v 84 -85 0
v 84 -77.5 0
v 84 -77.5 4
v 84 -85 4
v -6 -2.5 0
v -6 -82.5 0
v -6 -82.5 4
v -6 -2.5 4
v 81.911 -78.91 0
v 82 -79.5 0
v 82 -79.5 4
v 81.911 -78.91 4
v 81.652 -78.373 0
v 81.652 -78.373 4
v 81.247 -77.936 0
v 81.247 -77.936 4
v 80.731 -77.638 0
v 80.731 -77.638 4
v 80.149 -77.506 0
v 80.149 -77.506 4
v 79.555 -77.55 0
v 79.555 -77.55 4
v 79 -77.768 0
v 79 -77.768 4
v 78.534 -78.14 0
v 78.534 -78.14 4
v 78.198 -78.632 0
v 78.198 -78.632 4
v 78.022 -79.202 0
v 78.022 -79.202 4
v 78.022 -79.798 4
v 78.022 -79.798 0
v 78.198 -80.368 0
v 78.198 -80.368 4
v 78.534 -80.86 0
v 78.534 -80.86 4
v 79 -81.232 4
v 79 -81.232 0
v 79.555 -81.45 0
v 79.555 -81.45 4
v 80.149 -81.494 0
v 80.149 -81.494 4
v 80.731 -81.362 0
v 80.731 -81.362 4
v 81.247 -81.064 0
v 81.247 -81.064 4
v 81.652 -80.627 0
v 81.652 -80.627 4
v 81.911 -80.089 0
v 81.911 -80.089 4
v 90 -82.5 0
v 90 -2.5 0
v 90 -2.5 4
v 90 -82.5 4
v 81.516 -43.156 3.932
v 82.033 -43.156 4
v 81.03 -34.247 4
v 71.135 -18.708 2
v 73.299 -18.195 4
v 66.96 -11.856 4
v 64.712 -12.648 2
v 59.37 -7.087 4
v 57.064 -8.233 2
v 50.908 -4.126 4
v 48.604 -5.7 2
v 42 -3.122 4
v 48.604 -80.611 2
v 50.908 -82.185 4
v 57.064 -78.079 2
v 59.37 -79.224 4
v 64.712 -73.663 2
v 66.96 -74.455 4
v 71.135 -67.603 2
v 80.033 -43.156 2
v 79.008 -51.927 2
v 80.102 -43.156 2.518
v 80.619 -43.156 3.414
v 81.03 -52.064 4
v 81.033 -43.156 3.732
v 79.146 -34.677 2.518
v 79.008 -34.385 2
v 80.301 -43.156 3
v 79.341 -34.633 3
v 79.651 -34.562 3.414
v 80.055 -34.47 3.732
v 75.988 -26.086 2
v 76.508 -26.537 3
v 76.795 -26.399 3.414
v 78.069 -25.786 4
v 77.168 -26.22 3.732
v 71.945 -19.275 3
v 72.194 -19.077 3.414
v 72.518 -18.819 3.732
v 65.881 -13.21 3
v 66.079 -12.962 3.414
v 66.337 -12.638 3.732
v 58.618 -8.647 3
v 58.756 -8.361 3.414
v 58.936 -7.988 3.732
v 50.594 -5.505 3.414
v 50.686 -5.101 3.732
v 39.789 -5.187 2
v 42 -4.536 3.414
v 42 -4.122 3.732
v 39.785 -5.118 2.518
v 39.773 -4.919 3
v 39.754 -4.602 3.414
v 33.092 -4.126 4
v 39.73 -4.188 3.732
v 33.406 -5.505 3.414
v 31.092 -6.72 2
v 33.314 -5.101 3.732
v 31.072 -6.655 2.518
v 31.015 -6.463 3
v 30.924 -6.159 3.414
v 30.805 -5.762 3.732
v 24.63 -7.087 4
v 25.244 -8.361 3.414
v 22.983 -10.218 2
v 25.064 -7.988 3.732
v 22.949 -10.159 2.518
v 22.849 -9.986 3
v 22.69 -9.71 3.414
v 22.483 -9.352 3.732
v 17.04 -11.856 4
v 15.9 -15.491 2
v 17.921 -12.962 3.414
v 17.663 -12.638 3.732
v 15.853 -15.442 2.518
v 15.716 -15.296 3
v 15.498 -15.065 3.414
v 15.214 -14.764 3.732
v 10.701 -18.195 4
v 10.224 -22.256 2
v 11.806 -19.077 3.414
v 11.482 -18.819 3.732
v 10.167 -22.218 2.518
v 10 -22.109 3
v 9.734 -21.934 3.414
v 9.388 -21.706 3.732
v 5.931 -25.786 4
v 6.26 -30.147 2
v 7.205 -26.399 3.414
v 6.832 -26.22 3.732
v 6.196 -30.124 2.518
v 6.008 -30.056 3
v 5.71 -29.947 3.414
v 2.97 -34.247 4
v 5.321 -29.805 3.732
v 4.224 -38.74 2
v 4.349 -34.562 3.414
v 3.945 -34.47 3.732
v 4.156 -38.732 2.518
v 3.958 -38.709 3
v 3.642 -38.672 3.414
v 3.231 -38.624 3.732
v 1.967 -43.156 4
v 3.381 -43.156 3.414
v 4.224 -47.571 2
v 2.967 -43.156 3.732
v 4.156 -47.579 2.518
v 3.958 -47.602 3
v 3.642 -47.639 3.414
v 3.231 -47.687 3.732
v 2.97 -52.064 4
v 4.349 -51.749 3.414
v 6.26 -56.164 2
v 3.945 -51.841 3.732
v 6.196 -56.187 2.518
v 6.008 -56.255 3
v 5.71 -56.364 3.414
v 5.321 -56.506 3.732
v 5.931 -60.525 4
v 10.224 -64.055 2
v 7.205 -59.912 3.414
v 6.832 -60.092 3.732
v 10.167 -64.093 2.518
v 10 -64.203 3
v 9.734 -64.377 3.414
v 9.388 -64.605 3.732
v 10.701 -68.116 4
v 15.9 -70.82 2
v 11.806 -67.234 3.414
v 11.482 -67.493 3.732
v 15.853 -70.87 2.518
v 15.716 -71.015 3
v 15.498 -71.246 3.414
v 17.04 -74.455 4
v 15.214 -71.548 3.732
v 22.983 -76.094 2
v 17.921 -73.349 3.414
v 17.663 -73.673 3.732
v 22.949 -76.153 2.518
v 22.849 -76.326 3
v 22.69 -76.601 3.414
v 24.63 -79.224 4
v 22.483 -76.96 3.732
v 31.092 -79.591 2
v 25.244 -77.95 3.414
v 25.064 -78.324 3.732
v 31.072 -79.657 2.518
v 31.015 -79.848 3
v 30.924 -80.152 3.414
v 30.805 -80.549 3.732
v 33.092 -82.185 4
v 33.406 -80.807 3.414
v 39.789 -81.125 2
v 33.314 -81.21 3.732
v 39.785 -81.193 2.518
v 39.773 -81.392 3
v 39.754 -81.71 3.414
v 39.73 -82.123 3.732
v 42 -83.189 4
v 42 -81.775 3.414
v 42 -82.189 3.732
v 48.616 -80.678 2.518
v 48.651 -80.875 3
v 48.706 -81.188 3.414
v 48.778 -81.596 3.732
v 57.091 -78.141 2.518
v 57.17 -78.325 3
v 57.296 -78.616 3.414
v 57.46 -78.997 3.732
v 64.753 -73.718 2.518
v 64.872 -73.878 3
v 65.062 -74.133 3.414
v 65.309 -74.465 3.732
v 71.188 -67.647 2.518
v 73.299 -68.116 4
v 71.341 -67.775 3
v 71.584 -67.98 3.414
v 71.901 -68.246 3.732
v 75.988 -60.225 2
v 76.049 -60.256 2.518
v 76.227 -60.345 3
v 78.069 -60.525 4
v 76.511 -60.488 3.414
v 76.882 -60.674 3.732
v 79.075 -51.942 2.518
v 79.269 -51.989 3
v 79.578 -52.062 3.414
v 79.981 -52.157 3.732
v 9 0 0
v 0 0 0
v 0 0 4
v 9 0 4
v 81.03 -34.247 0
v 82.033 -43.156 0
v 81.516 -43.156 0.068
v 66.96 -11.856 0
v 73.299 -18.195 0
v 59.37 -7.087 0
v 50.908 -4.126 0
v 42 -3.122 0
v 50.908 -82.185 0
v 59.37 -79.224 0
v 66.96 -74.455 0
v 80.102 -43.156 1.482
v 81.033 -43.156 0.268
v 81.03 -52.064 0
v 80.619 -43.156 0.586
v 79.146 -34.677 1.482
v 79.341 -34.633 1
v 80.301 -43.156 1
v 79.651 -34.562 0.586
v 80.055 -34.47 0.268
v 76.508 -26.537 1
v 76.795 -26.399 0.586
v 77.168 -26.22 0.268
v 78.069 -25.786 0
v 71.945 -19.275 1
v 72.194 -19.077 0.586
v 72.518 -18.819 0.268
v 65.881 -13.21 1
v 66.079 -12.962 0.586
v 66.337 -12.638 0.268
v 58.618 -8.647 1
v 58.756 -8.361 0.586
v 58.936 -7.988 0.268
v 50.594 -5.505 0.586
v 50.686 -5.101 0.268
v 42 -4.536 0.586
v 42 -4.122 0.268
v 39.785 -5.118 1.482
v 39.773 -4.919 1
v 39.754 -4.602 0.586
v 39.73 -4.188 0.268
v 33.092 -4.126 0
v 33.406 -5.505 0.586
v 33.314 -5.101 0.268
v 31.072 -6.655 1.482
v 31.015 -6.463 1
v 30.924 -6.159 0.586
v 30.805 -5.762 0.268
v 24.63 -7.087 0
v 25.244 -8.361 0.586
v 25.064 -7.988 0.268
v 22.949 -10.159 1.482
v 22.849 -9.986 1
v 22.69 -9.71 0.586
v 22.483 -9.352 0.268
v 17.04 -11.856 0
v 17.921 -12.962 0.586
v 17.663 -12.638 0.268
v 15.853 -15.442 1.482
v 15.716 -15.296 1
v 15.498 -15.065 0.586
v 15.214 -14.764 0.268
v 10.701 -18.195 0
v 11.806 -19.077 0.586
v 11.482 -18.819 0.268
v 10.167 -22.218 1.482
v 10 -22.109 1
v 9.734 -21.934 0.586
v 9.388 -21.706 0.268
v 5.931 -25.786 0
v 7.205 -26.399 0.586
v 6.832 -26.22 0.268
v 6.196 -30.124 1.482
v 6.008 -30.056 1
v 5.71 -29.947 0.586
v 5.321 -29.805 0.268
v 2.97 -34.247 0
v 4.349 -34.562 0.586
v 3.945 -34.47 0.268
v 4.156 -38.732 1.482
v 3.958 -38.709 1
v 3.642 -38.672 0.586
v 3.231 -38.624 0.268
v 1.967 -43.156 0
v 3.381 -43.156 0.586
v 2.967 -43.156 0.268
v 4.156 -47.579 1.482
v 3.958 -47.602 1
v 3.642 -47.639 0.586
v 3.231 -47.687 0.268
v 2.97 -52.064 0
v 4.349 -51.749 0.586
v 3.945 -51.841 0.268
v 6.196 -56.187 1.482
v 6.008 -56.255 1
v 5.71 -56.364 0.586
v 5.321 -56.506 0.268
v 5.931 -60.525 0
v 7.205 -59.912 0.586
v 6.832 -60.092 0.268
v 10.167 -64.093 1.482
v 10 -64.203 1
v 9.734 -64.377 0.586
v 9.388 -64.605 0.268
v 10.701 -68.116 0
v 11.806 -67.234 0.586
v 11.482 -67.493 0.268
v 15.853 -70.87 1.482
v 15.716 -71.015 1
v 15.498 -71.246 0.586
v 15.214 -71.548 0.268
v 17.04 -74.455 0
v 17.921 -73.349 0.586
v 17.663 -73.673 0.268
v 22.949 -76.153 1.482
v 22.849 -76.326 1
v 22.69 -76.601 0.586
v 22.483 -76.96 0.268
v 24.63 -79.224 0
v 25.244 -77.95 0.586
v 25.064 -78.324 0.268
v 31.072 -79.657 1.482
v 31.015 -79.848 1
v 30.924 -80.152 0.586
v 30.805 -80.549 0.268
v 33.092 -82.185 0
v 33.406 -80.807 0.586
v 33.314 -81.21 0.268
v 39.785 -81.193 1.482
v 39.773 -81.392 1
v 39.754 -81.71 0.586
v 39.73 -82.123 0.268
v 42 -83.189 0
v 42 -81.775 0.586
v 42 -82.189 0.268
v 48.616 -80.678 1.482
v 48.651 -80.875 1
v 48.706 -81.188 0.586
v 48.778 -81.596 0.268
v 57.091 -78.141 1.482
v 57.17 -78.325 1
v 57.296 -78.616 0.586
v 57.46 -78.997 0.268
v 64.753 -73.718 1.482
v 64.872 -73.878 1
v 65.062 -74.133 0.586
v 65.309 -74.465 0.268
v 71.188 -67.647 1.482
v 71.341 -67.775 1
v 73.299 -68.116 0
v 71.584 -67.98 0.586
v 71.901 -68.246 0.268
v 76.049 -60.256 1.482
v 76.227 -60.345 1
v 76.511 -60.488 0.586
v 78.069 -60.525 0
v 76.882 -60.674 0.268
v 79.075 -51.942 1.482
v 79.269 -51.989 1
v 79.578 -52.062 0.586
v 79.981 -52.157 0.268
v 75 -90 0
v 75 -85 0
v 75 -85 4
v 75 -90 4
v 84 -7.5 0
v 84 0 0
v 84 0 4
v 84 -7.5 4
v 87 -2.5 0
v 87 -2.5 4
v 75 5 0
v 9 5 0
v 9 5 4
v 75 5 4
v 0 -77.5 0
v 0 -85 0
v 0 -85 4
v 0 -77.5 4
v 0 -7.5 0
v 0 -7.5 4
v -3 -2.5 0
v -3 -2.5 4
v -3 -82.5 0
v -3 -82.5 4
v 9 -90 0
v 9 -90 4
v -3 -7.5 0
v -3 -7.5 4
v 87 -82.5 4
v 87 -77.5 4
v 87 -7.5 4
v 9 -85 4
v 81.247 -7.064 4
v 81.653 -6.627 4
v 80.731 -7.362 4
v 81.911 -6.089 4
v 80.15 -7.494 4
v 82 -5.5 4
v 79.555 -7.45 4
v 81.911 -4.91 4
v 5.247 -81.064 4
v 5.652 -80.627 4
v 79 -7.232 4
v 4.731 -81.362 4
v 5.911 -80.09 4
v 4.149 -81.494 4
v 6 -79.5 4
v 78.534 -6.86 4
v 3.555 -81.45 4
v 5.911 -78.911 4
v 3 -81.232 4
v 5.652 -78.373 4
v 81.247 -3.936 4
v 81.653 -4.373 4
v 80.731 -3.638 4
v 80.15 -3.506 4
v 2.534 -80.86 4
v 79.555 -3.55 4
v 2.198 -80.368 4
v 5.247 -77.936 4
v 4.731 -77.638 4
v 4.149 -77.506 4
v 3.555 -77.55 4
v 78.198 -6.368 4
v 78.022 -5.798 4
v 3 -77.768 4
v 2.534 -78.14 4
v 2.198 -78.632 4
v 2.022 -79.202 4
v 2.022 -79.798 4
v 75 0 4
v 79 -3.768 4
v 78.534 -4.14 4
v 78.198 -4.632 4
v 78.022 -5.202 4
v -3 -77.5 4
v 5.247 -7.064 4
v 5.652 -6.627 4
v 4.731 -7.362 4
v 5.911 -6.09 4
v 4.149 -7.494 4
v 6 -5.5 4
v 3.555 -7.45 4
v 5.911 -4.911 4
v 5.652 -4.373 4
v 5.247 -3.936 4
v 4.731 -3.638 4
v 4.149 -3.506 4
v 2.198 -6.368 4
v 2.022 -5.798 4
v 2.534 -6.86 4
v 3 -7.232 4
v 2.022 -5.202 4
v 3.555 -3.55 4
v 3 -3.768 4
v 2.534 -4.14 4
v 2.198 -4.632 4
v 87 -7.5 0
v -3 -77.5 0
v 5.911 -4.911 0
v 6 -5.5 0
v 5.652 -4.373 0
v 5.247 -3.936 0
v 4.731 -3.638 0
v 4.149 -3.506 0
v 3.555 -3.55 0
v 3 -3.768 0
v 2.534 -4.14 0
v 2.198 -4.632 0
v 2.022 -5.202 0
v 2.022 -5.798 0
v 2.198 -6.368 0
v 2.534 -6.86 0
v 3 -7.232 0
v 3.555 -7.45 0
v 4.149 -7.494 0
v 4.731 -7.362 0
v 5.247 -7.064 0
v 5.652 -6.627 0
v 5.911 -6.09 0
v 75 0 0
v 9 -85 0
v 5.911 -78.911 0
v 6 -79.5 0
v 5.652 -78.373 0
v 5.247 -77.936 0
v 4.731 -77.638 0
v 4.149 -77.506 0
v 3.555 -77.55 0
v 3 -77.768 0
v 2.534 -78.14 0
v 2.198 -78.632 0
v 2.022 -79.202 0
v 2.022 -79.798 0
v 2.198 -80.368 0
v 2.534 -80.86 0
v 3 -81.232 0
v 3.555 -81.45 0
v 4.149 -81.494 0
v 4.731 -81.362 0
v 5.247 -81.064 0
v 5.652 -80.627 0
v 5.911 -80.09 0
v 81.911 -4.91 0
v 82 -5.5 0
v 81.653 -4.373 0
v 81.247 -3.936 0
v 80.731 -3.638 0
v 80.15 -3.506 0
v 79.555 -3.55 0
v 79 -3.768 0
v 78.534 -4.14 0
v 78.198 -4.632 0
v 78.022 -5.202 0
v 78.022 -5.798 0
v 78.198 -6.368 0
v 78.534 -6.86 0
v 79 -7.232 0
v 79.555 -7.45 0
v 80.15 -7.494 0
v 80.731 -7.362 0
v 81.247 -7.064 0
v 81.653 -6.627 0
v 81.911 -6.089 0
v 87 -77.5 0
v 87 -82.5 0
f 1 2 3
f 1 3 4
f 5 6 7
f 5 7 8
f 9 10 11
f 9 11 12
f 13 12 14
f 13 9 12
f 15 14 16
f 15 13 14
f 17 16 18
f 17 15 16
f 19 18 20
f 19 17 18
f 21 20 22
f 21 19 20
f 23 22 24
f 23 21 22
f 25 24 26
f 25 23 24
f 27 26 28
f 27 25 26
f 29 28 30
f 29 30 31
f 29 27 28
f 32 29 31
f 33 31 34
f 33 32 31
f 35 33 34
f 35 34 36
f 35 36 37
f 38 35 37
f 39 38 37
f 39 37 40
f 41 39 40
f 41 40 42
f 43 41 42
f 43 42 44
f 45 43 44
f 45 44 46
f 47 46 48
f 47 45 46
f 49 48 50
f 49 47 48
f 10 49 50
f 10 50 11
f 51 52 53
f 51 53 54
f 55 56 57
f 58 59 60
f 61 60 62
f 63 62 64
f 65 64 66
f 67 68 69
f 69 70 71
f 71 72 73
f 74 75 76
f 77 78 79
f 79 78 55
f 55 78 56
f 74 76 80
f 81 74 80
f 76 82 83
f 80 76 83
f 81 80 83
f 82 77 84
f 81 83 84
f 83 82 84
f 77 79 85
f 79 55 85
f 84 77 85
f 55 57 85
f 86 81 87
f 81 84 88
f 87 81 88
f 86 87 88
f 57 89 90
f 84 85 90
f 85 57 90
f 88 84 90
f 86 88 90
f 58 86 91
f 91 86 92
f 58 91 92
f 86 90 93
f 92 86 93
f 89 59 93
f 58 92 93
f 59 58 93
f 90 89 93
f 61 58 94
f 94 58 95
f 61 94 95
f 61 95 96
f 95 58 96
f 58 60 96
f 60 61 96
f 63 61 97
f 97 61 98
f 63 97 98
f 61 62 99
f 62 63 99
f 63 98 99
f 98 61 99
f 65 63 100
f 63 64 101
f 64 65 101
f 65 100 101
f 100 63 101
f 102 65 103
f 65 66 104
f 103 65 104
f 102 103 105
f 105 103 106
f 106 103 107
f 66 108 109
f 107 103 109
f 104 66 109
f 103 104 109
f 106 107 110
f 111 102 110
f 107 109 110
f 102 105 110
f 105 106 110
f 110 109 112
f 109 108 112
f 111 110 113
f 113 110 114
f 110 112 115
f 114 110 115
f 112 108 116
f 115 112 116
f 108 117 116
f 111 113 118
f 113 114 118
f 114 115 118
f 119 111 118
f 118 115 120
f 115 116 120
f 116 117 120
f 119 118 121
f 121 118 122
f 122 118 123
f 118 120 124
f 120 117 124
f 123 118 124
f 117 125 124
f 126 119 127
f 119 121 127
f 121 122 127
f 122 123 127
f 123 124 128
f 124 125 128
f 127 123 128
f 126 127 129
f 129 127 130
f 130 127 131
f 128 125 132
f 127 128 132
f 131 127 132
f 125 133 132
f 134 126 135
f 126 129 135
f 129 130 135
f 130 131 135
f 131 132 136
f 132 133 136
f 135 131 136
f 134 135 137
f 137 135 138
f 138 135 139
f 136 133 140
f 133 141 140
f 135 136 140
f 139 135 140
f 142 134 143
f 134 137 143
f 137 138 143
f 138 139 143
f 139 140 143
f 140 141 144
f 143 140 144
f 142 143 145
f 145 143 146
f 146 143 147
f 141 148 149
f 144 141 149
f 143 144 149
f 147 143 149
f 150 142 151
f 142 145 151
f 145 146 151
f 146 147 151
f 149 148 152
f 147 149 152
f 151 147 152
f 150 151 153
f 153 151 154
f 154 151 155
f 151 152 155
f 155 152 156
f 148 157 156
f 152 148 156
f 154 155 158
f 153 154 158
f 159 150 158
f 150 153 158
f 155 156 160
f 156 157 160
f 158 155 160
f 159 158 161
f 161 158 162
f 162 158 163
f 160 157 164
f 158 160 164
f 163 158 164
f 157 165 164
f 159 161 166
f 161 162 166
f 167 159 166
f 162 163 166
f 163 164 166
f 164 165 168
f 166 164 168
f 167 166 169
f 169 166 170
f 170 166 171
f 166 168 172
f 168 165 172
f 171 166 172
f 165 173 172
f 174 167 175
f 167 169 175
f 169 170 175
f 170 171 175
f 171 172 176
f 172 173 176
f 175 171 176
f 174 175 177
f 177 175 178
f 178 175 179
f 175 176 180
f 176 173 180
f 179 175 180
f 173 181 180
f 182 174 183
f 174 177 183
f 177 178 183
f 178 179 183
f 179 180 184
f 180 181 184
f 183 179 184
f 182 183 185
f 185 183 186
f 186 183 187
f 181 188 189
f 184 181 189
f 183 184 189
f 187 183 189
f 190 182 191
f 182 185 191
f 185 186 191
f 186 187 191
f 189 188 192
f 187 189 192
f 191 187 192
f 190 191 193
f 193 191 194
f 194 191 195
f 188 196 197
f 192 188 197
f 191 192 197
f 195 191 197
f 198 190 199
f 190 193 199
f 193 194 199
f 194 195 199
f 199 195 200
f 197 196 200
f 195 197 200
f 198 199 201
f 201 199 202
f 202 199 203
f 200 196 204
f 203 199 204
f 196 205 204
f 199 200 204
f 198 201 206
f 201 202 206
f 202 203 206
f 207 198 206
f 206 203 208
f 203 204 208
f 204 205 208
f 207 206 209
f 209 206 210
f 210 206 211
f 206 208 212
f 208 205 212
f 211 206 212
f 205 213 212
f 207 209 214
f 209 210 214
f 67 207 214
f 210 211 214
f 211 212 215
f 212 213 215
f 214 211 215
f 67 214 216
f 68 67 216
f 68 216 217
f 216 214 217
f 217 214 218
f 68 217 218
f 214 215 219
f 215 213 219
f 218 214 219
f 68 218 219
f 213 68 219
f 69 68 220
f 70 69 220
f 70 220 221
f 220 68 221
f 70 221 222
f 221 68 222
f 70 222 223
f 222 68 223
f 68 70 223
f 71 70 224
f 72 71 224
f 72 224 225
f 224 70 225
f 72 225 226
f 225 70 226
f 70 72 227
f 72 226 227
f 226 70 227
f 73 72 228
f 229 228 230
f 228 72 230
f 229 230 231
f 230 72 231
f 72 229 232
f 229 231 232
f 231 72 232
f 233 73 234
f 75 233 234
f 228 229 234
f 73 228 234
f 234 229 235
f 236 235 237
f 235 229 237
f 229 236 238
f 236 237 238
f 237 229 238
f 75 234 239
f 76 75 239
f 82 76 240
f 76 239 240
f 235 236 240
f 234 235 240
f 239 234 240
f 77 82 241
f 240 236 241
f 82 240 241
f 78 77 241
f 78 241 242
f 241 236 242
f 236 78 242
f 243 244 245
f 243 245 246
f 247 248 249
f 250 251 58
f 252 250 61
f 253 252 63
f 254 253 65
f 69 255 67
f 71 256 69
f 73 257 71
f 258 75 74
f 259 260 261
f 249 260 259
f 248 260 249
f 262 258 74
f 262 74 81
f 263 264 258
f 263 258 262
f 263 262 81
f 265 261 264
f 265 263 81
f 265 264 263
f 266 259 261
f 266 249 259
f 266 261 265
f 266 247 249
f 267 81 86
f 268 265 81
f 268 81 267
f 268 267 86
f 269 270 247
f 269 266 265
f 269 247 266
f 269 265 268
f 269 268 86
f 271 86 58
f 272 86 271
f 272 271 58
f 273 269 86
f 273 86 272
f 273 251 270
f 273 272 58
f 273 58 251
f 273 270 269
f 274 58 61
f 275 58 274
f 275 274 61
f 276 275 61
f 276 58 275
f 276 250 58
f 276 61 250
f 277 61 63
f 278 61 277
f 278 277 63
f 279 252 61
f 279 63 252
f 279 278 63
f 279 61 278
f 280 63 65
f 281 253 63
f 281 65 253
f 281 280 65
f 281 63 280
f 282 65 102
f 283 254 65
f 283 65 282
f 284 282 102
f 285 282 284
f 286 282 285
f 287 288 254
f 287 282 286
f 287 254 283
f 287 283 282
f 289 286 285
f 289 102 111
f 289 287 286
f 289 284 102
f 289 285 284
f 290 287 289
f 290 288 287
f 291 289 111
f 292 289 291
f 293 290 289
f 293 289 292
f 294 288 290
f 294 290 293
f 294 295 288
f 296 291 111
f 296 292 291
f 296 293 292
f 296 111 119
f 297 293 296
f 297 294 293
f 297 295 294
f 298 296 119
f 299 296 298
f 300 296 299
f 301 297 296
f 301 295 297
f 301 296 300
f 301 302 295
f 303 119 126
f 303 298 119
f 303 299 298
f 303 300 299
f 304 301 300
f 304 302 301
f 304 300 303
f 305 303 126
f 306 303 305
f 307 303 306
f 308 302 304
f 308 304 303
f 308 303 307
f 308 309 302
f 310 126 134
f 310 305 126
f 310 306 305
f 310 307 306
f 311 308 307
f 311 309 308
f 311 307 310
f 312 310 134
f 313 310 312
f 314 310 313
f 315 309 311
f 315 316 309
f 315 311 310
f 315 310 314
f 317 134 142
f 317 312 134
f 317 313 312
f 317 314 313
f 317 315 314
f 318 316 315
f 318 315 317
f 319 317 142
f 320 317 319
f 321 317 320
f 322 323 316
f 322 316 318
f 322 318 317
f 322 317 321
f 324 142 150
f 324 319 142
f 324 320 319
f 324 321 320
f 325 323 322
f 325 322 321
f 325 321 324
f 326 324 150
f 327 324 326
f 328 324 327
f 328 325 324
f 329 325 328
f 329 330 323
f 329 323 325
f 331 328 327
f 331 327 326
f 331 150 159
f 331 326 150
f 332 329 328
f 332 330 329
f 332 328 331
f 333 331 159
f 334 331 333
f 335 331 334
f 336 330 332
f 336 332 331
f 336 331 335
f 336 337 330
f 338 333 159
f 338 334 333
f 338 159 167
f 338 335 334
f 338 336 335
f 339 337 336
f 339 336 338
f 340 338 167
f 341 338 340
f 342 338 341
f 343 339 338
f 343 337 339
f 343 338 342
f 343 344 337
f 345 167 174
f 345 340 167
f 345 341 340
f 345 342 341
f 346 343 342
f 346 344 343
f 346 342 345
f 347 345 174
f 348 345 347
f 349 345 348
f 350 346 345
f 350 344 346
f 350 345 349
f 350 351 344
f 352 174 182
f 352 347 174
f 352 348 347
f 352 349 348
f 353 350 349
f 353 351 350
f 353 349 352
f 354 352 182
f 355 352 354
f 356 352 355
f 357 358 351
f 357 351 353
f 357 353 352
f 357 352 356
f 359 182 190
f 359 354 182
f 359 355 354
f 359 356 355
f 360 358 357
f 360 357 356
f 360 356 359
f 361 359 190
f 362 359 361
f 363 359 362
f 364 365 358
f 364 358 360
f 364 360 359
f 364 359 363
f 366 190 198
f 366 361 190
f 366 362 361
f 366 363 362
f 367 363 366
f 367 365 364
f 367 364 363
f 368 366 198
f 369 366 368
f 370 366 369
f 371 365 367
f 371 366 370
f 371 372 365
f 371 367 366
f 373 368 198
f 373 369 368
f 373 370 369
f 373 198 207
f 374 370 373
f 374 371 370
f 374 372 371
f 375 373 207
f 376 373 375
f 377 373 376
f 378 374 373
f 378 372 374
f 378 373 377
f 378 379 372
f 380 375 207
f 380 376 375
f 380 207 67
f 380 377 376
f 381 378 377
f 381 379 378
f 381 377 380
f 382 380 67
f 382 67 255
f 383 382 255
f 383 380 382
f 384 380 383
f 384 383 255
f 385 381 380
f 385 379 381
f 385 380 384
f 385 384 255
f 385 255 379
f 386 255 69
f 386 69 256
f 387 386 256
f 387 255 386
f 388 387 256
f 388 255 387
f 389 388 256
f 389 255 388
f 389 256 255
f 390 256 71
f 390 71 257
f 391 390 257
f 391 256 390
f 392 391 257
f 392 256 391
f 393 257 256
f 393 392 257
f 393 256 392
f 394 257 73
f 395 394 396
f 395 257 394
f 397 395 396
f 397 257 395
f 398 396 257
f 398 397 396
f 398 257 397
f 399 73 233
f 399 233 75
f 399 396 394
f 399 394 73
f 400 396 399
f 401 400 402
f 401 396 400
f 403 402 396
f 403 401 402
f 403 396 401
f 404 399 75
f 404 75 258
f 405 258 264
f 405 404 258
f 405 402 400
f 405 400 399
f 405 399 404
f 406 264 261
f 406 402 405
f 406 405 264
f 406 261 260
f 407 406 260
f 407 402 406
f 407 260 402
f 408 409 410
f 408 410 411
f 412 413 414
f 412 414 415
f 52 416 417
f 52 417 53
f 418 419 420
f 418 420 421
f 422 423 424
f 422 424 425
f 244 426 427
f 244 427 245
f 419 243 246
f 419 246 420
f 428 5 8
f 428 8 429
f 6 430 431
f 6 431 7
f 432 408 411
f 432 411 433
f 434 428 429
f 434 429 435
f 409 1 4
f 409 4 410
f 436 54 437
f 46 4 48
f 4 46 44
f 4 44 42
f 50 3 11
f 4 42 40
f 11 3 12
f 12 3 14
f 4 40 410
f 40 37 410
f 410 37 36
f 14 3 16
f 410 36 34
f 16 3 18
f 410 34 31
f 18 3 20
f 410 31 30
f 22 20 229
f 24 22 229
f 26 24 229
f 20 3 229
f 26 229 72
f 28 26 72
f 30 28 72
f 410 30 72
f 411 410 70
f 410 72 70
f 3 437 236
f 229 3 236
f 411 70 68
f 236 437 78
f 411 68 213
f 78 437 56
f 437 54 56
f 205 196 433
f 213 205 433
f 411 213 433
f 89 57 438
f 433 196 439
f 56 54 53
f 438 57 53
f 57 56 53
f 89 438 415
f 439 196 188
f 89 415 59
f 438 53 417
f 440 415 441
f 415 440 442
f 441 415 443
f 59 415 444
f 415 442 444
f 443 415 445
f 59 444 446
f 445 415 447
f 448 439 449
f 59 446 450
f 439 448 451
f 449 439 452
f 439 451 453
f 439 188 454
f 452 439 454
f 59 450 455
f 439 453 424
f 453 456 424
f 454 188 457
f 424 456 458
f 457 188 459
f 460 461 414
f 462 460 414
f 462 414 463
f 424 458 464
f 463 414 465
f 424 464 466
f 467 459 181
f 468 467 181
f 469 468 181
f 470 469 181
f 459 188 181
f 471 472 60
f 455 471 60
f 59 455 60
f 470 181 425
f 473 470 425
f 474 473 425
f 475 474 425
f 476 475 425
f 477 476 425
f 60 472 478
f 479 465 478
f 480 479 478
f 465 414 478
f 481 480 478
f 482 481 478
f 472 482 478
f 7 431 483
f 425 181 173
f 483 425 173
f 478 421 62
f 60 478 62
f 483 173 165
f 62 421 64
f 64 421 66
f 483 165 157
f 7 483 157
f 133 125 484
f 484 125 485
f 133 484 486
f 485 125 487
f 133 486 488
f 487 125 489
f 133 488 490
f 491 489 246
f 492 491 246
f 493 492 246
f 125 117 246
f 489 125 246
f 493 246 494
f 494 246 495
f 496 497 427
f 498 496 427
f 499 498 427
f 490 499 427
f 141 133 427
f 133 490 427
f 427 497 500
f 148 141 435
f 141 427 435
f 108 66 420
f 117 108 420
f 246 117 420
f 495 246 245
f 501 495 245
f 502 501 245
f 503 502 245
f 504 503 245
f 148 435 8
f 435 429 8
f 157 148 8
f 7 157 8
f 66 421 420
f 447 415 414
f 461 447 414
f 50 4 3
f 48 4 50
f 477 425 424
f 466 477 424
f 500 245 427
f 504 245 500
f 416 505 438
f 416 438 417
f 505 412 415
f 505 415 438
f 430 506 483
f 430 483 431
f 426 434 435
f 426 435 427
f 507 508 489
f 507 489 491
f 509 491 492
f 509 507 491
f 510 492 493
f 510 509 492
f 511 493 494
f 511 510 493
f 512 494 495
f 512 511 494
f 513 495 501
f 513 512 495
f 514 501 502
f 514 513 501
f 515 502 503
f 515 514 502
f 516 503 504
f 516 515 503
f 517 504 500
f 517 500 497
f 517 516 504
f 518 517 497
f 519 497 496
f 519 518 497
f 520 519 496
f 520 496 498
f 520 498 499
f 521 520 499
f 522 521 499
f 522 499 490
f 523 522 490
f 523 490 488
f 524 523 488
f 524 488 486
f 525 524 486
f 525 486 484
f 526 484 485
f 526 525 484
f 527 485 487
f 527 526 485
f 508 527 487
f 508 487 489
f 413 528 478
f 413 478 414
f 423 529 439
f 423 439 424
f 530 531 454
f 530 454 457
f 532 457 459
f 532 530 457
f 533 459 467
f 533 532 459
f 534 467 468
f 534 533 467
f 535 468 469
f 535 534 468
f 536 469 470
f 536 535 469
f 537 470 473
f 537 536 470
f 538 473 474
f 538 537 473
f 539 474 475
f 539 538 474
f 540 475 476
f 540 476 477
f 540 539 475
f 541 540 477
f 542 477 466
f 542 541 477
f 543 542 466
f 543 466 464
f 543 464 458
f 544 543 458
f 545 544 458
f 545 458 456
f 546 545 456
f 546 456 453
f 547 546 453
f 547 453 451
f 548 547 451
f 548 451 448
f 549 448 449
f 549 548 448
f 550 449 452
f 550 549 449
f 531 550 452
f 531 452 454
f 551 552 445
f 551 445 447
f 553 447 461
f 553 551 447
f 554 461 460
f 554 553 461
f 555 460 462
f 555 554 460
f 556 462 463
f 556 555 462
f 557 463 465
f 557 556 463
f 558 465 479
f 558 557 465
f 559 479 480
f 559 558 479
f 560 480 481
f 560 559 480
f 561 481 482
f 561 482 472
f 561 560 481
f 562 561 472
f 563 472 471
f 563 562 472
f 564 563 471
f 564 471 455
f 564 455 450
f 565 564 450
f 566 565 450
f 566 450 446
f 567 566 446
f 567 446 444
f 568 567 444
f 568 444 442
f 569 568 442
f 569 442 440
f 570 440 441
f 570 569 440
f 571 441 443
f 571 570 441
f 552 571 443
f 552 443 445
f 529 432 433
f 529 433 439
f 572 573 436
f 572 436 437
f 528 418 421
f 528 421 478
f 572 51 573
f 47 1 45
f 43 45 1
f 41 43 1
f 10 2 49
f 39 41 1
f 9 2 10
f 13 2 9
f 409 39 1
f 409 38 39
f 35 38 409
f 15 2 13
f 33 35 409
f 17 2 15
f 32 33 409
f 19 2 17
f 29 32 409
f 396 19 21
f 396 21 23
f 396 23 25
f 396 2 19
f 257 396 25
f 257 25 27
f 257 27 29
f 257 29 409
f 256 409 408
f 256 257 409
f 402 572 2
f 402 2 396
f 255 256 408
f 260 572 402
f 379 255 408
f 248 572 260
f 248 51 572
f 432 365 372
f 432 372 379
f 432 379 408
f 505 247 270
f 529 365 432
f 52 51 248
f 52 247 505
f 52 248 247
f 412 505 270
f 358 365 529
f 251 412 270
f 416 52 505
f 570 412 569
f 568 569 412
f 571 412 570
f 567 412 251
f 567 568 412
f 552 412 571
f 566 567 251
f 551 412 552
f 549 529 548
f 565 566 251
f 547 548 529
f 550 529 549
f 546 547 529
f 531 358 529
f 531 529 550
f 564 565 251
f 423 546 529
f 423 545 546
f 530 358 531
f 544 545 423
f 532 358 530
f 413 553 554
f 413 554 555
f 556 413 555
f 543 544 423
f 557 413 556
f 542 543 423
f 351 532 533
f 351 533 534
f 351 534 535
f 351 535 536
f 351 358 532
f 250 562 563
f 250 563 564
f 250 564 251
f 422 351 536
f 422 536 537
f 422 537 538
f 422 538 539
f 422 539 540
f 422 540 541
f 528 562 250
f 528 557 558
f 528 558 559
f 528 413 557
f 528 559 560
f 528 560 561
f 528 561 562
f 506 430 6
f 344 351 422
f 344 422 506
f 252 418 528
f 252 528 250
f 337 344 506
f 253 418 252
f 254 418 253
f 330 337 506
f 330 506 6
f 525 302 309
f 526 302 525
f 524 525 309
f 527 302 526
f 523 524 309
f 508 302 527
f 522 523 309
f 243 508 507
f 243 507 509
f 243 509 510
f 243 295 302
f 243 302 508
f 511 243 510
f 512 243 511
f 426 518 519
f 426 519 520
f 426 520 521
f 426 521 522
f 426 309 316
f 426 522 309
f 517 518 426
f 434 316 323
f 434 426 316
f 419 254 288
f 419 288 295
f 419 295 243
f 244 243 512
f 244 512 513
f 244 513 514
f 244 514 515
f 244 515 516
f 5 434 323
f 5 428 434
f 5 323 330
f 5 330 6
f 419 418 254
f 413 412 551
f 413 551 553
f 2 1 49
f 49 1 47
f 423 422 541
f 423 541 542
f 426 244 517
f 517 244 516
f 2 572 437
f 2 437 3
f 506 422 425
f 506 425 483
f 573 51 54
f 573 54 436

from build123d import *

# Parameters (mm, degrees)
SKETCH1_R           = 2
SKETCH1_R_2         = 38.03346271
BOSS_EXTRUDE1_DEPTH = 4
FILLET1_R           = 2


with BuildPart() as part:
    # Sketch1 → Boss-Extrude1 (new body)
    with BuildSketch(Plane.XY):
        Polygon((0, 0), (9, 0), (9, 5), (75, 5), (74.999999866, -2.502e-06), (84, 0), (84, -7.5), (87, -7.5), (87, -2.5), (90, -2.5), (90, -82.5), (87, -82.5), (87, -77.5), (84, -77.5), (84, -85.000002502), (74.999993421, -85.000002502), (74.999993042, -90.000002502), (9, -90), (9, -85), (0, -85), (0, -77.5), (-3, -77.5), (-3, -82.5), (-6, -82.5), (-6, -2.5), (-3, -2.5), (-3, -7.5), (0, -7.5), align=None)
        with Locations((4, -5.500026536)):
            Circle(SKETCH1_R, mode=Mode.SUBTRACT)
        with Locations((80.000043308, -5.499945424)):
            Circle(SKETCH1_R, mode=Mode.SUBTRACT)
        with Locations((80, -79.499973464)):
            Circle(SKETCH1_R, mode=Mode.SUBTRACT)
        with Locations((3.999956692, -79.500054576)):
            Circle(SKETCH1_R, mode=Mode.SUBTRACT)
        with Locations((41.999998297, -43.155631615)):
            Circle(SKETCH1_R_2, mode=Mode.SUBTRACT)
    extrude(amount=BOSS_EXTRUDE1_DEPTH)

    # Fillet1
    fillet1_edges = [part.edges().sort_by_distance(p)[0] for p in [
        (3.966535587, -43.155631615, 0),
        (3.966535587, -43.155631615, 4),
    ]]
    fillet(fillet1_edges, radius=FILLET1_R - 0.0001)  # a hair under: the kernel refuses the full size


solid = part.part
